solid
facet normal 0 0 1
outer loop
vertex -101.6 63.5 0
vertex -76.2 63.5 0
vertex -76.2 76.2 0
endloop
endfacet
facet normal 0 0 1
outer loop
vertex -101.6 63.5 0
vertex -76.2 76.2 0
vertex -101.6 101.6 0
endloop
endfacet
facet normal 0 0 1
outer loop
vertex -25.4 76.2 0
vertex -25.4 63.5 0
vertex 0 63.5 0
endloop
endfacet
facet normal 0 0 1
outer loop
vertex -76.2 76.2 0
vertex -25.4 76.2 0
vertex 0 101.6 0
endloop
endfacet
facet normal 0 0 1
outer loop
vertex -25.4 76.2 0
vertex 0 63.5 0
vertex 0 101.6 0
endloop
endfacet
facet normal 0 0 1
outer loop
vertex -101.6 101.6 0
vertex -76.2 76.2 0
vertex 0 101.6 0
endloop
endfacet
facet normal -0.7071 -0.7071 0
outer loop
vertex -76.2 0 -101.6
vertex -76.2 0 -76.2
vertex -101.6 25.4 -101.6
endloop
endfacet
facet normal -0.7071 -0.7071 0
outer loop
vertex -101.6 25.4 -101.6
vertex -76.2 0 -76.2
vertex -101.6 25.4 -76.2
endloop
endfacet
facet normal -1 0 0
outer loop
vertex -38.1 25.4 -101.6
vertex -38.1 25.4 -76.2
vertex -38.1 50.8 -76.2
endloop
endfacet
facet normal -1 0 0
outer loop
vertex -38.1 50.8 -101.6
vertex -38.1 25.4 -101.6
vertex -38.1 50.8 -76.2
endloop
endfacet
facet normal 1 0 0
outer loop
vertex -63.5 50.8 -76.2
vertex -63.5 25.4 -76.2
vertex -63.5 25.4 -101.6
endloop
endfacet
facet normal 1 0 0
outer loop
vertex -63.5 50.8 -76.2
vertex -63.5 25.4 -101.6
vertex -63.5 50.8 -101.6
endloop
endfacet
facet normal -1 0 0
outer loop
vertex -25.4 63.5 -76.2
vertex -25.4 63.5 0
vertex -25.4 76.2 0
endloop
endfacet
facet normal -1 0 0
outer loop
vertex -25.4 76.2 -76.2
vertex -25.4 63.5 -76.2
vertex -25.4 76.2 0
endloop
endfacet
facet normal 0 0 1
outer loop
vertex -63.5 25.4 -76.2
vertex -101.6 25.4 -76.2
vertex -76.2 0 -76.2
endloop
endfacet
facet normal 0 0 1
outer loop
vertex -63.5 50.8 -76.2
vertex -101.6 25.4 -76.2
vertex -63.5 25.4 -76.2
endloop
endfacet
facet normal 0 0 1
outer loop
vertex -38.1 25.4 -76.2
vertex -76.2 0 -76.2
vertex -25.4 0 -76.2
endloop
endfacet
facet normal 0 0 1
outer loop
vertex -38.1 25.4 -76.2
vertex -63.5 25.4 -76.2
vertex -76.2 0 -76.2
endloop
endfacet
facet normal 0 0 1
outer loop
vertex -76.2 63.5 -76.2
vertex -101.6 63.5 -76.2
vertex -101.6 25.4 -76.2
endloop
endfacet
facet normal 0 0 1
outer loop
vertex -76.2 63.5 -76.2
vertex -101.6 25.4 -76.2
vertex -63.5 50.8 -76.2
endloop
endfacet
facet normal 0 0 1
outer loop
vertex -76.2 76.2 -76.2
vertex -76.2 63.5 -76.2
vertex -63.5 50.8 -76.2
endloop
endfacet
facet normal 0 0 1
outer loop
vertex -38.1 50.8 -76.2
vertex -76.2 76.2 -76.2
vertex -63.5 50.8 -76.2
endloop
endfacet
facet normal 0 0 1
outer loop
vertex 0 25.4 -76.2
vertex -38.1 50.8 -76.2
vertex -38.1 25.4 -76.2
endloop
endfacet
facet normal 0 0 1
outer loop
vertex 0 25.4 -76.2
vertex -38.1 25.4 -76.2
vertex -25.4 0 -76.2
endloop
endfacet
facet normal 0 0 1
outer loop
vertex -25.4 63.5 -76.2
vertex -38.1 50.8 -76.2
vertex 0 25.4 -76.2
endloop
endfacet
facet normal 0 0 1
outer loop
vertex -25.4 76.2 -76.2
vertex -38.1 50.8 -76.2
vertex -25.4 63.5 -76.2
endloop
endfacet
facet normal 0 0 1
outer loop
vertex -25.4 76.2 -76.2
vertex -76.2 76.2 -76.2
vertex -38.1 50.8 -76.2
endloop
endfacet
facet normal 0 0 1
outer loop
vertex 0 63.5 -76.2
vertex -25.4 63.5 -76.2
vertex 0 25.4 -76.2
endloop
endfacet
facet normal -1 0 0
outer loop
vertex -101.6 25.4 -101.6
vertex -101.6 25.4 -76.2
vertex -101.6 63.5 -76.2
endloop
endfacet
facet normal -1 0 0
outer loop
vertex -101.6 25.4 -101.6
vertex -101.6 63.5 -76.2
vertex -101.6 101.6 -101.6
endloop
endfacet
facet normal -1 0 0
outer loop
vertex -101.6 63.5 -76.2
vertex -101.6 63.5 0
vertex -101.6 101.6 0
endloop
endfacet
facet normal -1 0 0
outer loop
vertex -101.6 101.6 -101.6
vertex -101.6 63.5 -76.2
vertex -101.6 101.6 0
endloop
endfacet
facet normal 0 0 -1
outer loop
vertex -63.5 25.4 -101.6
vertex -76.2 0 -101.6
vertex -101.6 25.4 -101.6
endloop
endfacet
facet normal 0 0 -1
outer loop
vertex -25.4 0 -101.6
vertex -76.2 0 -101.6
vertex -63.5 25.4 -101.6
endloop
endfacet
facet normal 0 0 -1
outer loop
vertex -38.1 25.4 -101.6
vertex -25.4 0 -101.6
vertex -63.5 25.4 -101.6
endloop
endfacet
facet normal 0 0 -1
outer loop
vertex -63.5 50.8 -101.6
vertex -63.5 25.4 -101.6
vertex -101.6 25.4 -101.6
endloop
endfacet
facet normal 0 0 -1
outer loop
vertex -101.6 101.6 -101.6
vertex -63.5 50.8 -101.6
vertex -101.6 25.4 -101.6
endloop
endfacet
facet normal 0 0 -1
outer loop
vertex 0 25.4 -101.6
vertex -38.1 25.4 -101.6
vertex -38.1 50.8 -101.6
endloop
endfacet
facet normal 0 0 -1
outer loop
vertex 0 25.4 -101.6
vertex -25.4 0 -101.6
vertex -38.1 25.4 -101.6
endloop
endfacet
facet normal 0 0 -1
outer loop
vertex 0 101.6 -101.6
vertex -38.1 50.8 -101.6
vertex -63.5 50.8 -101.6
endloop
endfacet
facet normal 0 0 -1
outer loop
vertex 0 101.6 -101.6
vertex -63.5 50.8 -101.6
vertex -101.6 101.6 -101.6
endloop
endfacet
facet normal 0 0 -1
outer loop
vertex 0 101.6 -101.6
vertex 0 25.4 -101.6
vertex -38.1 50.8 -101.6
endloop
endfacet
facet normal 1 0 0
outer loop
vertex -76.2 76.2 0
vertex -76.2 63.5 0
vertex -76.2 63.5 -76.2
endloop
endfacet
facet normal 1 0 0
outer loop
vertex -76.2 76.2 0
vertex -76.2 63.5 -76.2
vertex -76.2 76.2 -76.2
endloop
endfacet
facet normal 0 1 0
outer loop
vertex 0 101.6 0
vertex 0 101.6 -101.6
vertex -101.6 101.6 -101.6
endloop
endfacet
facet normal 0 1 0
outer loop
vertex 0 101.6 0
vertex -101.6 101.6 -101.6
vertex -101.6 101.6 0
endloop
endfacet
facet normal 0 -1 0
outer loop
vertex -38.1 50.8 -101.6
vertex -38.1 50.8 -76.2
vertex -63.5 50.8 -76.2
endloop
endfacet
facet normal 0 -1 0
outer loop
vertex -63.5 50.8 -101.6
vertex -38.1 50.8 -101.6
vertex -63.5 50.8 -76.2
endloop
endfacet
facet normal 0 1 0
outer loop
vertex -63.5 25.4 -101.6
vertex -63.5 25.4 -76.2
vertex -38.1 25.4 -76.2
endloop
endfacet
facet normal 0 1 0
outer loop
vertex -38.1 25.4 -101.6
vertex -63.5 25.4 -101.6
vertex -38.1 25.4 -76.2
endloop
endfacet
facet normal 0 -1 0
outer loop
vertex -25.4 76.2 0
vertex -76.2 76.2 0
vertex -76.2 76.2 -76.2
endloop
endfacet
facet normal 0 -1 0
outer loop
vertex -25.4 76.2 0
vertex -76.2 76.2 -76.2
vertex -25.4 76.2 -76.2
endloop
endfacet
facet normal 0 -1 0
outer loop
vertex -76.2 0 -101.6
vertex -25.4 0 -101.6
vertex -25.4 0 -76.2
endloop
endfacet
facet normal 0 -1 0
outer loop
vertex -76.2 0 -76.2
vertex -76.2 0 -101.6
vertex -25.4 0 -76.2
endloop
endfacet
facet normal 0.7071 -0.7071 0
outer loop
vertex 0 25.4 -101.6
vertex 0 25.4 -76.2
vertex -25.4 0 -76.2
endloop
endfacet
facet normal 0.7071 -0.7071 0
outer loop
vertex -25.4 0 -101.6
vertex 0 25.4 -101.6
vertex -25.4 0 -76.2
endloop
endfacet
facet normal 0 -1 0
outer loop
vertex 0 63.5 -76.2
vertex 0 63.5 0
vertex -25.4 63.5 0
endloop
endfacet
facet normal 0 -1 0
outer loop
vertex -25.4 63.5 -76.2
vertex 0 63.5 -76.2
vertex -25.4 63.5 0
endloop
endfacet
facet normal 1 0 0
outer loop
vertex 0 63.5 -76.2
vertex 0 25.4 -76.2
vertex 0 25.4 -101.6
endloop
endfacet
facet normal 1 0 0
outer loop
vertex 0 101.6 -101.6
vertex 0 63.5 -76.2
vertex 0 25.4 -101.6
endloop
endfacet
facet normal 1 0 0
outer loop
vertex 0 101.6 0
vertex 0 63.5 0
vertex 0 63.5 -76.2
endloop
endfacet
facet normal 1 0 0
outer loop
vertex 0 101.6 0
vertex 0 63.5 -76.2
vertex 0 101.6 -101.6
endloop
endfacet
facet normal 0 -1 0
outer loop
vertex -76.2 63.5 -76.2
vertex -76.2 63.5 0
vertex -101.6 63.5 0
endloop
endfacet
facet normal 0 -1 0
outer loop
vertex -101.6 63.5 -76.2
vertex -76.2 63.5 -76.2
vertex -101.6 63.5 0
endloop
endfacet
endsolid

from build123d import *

# Parameters (mm, degrees)
F0_W     = 101.6
F0_H     = 101.6
F1_DEPTH = 101.6
F3_DEPTH = 76.2
F4_W     = 50.8
F4_H     = 12.7
F5_DEPTH = 76.2
F6_W     = 12.7
F6_H     = 25.4
F7_DEPTH = 68.326


with BuildPart() as f1:
    # F0 (on Right) → F1 (new body)
    with BuildSketch(Plane.YZ):
        with Locations((50.8, -50.8)):
            Rectangle(F0_W, F0_H)
    extrude(amount=-F1_DEPTH)

    # F2 (on face) → F3 (cut)
    with BuildSketch(Plane.XY):
        Polygon((-76.2, 63.5), (-101.6, 63.5), (-101.6, 0), (0, 0), (0, 63.5), (-25.4, 63.5), align=None)
    extrude(amount=-F3_DEPTH, mode=Mode.SUBTRACT)

    # F4 (on face) → F5 (cut)
    with BuildSketch(Plane.XY):
        with Locations((-50.8, 69.85)):
            Rectangle(F4_W, F4_H)
    extrude(amount=-F5_DEPTH, mode=Mode.SUBTRACT)

    # F6 (on face) → F7 (cut)
    with BuildSketch(Plane.XY.offset(-76.2)):
        Polygon((-101.6, 25.4), (-101.6, 0), (-76.2, 0), align=None)
        Polygon((0, 0), (0, 25.4), (-25.4, 0), align=None)
        with Locations((-57.15, 38.1)):
            Rectangle(F6_W, F6_H)
        with Locations((-44.45, 38.1)):
            Rectangle(F6_W, F6_H)
    extrude(amount=-F7_DEPTH, mode=Mode.SUBTRACT)


solid = f1.part
